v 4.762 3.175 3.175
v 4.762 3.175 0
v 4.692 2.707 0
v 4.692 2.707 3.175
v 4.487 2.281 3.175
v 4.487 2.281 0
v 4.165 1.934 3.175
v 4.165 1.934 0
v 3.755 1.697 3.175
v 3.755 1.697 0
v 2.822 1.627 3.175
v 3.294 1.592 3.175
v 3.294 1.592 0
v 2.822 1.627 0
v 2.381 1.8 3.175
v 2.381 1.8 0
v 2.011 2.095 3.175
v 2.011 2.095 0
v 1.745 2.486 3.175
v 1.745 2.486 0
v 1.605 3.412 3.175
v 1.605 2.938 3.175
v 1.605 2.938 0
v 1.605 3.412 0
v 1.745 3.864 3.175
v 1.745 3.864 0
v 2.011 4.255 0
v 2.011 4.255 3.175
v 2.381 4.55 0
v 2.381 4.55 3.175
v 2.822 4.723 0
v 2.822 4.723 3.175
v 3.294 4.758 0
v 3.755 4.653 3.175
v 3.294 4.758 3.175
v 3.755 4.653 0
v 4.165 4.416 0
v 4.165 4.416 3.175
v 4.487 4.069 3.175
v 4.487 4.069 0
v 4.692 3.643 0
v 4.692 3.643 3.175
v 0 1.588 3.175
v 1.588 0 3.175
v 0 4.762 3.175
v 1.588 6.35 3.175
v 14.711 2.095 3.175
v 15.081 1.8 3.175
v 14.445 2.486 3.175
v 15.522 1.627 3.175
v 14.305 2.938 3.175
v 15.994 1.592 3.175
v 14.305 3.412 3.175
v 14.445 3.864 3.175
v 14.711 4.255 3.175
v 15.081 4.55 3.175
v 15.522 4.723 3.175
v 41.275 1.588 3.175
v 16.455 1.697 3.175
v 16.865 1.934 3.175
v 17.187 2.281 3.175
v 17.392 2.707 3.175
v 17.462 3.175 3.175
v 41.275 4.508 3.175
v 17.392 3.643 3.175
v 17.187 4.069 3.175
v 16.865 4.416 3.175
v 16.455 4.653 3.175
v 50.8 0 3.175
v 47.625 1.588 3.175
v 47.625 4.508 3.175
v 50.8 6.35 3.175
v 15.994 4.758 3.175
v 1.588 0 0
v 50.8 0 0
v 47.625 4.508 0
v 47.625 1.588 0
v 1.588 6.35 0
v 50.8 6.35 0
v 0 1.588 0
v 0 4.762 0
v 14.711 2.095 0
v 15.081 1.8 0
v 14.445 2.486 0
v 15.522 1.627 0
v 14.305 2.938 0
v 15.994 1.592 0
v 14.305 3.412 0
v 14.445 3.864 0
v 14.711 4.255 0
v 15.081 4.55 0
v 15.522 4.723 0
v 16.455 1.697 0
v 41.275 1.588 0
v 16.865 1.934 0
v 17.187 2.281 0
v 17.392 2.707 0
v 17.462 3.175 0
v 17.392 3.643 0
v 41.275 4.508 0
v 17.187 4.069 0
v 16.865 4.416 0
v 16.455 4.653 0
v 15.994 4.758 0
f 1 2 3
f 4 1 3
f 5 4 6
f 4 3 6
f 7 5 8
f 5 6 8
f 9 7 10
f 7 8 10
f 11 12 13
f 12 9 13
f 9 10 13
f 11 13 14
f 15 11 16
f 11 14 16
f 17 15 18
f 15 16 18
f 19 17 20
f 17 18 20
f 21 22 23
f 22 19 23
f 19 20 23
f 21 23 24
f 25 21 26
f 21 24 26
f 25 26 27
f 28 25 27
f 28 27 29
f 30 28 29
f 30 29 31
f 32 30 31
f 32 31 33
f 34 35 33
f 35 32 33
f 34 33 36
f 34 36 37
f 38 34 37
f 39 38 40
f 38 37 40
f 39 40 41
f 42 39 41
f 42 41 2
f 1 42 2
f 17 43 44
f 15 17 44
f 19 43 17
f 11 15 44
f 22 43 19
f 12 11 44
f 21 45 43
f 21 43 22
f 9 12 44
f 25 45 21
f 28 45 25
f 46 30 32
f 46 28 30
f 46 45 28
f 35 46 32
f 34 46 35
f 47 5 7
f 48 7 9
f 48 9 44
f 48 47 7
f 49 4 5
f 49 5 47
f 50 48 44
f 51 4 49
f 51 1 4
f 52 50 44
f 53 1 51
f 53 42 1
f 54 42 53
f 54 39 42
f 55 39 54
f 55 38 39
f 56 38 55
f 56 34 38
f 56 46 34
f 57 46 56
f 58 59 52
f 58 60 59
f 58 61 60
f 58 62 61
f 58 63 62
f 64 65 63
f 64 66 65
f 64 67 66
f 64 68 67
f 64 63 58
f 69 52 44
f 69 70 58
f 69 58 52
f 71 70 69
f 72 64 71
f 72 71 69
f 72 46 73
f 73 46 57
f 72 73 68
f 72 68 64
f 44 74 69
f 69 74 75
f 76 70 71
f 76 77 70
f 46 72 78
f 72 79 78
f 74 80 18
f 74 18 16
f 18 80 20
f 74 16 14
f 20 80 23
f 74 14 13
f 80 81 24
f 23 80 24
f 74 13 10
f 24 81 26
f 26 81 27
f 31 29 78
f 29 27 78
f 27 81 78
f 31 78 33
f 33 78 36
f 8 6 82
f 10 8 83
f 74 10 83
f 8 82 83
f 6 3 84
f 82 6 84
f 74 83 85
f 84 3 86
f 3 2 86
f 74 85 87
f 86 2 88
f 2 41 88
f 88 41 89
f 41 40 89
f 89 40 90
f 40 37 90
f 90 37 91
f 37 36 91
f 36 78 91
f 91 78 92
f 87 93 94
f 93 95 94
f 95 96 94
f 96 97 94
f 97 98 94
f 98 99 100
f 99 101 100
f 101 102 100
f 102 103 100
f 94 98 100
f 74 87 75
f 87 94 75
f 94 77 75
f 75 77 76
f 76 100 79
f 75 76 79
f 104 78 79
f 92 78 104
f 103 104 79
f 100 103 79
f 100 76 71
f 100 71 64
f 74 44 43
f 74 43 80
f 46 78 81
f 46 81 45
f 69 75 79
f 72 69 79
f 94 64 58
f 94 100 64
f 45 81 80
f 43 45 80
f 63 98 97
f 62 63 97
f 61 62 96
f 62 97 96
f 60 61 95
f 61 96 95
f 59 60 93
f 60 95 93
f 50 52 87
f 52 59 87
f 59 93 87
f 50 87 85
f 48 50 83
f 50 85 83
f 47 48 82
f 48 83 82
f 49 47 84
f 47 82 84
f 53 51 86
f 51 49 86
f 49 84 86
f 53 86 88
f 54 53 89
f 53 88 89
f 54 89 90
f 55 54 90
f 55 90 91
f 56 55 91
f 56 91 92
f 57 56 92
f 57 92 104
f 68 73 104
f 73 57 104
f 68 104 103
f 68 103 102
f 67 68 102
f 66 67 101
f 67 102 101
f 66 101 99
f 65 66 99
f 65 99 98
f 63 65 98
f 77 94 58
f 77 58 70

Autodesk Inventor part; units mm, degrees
ref_plane "YZ Plane" through (0, 0, 0) normal (1, 0, 0) x (0, 1, 0)
ref_plane "XZ Plane" through (0, 0, 0) normal (0, 1, 0) x (-1, 0, 0)
ref_plane "XY Plane" through (0, 0, 0) normal (0, 0, 1) x (1, 0, 0)
sketch "Sketch1" plane through (0, 0, 0) normal (0, 0, 1) x (1, 0, 0)
  line L0 (0, 0) -> (50.8, 0)
  line L1 (50.8, 0) -> (50.8, 6.35)
  line L2 (50.8, 6.35) -> (0, 6.35)
  line L3 (0, 6.35) -> (0, 0)
  circle A0 centre (3.175, 3.175) radius 1.5875
  circle A1 centre (15.875, 3.175) radius 1.5875
  line L4 (41.275, 1.5875) -> (47.625, 1.5875)
  line L5 (47.625, 1.5875) -> (47.625, 4.5085)
  line L6 (47.625, 4.5085) -> (41.275, 4.5085)
  line L7 (41.275, 4.5085) -> (41.275, 1.5875)
  dimension "d0" = 50.8
  dimension "d1" = 6.35
  dimension "d2" = 3.175
  dimension "d3" = 3.175
  dimension "d4" = 3.175
  dimension "d5" = 3.175
  dimension "d6" = 3.175
  dimension "d7" = 12.7
  dimension "d8" = 2.921
  dimension "d9" = 1.5875
  dimension "d10" = 6.35
  dimension "d11" = 3.175
extrude "Extrusion1" add sketch "Sketch1" along normal blind 3.175
chamfer "Chamfer1" distance 1.5875 angle 45 2 edges at (0, 6.35, 1.5875) (0, 0, 1.5875)
properties part number "camera_arm"
